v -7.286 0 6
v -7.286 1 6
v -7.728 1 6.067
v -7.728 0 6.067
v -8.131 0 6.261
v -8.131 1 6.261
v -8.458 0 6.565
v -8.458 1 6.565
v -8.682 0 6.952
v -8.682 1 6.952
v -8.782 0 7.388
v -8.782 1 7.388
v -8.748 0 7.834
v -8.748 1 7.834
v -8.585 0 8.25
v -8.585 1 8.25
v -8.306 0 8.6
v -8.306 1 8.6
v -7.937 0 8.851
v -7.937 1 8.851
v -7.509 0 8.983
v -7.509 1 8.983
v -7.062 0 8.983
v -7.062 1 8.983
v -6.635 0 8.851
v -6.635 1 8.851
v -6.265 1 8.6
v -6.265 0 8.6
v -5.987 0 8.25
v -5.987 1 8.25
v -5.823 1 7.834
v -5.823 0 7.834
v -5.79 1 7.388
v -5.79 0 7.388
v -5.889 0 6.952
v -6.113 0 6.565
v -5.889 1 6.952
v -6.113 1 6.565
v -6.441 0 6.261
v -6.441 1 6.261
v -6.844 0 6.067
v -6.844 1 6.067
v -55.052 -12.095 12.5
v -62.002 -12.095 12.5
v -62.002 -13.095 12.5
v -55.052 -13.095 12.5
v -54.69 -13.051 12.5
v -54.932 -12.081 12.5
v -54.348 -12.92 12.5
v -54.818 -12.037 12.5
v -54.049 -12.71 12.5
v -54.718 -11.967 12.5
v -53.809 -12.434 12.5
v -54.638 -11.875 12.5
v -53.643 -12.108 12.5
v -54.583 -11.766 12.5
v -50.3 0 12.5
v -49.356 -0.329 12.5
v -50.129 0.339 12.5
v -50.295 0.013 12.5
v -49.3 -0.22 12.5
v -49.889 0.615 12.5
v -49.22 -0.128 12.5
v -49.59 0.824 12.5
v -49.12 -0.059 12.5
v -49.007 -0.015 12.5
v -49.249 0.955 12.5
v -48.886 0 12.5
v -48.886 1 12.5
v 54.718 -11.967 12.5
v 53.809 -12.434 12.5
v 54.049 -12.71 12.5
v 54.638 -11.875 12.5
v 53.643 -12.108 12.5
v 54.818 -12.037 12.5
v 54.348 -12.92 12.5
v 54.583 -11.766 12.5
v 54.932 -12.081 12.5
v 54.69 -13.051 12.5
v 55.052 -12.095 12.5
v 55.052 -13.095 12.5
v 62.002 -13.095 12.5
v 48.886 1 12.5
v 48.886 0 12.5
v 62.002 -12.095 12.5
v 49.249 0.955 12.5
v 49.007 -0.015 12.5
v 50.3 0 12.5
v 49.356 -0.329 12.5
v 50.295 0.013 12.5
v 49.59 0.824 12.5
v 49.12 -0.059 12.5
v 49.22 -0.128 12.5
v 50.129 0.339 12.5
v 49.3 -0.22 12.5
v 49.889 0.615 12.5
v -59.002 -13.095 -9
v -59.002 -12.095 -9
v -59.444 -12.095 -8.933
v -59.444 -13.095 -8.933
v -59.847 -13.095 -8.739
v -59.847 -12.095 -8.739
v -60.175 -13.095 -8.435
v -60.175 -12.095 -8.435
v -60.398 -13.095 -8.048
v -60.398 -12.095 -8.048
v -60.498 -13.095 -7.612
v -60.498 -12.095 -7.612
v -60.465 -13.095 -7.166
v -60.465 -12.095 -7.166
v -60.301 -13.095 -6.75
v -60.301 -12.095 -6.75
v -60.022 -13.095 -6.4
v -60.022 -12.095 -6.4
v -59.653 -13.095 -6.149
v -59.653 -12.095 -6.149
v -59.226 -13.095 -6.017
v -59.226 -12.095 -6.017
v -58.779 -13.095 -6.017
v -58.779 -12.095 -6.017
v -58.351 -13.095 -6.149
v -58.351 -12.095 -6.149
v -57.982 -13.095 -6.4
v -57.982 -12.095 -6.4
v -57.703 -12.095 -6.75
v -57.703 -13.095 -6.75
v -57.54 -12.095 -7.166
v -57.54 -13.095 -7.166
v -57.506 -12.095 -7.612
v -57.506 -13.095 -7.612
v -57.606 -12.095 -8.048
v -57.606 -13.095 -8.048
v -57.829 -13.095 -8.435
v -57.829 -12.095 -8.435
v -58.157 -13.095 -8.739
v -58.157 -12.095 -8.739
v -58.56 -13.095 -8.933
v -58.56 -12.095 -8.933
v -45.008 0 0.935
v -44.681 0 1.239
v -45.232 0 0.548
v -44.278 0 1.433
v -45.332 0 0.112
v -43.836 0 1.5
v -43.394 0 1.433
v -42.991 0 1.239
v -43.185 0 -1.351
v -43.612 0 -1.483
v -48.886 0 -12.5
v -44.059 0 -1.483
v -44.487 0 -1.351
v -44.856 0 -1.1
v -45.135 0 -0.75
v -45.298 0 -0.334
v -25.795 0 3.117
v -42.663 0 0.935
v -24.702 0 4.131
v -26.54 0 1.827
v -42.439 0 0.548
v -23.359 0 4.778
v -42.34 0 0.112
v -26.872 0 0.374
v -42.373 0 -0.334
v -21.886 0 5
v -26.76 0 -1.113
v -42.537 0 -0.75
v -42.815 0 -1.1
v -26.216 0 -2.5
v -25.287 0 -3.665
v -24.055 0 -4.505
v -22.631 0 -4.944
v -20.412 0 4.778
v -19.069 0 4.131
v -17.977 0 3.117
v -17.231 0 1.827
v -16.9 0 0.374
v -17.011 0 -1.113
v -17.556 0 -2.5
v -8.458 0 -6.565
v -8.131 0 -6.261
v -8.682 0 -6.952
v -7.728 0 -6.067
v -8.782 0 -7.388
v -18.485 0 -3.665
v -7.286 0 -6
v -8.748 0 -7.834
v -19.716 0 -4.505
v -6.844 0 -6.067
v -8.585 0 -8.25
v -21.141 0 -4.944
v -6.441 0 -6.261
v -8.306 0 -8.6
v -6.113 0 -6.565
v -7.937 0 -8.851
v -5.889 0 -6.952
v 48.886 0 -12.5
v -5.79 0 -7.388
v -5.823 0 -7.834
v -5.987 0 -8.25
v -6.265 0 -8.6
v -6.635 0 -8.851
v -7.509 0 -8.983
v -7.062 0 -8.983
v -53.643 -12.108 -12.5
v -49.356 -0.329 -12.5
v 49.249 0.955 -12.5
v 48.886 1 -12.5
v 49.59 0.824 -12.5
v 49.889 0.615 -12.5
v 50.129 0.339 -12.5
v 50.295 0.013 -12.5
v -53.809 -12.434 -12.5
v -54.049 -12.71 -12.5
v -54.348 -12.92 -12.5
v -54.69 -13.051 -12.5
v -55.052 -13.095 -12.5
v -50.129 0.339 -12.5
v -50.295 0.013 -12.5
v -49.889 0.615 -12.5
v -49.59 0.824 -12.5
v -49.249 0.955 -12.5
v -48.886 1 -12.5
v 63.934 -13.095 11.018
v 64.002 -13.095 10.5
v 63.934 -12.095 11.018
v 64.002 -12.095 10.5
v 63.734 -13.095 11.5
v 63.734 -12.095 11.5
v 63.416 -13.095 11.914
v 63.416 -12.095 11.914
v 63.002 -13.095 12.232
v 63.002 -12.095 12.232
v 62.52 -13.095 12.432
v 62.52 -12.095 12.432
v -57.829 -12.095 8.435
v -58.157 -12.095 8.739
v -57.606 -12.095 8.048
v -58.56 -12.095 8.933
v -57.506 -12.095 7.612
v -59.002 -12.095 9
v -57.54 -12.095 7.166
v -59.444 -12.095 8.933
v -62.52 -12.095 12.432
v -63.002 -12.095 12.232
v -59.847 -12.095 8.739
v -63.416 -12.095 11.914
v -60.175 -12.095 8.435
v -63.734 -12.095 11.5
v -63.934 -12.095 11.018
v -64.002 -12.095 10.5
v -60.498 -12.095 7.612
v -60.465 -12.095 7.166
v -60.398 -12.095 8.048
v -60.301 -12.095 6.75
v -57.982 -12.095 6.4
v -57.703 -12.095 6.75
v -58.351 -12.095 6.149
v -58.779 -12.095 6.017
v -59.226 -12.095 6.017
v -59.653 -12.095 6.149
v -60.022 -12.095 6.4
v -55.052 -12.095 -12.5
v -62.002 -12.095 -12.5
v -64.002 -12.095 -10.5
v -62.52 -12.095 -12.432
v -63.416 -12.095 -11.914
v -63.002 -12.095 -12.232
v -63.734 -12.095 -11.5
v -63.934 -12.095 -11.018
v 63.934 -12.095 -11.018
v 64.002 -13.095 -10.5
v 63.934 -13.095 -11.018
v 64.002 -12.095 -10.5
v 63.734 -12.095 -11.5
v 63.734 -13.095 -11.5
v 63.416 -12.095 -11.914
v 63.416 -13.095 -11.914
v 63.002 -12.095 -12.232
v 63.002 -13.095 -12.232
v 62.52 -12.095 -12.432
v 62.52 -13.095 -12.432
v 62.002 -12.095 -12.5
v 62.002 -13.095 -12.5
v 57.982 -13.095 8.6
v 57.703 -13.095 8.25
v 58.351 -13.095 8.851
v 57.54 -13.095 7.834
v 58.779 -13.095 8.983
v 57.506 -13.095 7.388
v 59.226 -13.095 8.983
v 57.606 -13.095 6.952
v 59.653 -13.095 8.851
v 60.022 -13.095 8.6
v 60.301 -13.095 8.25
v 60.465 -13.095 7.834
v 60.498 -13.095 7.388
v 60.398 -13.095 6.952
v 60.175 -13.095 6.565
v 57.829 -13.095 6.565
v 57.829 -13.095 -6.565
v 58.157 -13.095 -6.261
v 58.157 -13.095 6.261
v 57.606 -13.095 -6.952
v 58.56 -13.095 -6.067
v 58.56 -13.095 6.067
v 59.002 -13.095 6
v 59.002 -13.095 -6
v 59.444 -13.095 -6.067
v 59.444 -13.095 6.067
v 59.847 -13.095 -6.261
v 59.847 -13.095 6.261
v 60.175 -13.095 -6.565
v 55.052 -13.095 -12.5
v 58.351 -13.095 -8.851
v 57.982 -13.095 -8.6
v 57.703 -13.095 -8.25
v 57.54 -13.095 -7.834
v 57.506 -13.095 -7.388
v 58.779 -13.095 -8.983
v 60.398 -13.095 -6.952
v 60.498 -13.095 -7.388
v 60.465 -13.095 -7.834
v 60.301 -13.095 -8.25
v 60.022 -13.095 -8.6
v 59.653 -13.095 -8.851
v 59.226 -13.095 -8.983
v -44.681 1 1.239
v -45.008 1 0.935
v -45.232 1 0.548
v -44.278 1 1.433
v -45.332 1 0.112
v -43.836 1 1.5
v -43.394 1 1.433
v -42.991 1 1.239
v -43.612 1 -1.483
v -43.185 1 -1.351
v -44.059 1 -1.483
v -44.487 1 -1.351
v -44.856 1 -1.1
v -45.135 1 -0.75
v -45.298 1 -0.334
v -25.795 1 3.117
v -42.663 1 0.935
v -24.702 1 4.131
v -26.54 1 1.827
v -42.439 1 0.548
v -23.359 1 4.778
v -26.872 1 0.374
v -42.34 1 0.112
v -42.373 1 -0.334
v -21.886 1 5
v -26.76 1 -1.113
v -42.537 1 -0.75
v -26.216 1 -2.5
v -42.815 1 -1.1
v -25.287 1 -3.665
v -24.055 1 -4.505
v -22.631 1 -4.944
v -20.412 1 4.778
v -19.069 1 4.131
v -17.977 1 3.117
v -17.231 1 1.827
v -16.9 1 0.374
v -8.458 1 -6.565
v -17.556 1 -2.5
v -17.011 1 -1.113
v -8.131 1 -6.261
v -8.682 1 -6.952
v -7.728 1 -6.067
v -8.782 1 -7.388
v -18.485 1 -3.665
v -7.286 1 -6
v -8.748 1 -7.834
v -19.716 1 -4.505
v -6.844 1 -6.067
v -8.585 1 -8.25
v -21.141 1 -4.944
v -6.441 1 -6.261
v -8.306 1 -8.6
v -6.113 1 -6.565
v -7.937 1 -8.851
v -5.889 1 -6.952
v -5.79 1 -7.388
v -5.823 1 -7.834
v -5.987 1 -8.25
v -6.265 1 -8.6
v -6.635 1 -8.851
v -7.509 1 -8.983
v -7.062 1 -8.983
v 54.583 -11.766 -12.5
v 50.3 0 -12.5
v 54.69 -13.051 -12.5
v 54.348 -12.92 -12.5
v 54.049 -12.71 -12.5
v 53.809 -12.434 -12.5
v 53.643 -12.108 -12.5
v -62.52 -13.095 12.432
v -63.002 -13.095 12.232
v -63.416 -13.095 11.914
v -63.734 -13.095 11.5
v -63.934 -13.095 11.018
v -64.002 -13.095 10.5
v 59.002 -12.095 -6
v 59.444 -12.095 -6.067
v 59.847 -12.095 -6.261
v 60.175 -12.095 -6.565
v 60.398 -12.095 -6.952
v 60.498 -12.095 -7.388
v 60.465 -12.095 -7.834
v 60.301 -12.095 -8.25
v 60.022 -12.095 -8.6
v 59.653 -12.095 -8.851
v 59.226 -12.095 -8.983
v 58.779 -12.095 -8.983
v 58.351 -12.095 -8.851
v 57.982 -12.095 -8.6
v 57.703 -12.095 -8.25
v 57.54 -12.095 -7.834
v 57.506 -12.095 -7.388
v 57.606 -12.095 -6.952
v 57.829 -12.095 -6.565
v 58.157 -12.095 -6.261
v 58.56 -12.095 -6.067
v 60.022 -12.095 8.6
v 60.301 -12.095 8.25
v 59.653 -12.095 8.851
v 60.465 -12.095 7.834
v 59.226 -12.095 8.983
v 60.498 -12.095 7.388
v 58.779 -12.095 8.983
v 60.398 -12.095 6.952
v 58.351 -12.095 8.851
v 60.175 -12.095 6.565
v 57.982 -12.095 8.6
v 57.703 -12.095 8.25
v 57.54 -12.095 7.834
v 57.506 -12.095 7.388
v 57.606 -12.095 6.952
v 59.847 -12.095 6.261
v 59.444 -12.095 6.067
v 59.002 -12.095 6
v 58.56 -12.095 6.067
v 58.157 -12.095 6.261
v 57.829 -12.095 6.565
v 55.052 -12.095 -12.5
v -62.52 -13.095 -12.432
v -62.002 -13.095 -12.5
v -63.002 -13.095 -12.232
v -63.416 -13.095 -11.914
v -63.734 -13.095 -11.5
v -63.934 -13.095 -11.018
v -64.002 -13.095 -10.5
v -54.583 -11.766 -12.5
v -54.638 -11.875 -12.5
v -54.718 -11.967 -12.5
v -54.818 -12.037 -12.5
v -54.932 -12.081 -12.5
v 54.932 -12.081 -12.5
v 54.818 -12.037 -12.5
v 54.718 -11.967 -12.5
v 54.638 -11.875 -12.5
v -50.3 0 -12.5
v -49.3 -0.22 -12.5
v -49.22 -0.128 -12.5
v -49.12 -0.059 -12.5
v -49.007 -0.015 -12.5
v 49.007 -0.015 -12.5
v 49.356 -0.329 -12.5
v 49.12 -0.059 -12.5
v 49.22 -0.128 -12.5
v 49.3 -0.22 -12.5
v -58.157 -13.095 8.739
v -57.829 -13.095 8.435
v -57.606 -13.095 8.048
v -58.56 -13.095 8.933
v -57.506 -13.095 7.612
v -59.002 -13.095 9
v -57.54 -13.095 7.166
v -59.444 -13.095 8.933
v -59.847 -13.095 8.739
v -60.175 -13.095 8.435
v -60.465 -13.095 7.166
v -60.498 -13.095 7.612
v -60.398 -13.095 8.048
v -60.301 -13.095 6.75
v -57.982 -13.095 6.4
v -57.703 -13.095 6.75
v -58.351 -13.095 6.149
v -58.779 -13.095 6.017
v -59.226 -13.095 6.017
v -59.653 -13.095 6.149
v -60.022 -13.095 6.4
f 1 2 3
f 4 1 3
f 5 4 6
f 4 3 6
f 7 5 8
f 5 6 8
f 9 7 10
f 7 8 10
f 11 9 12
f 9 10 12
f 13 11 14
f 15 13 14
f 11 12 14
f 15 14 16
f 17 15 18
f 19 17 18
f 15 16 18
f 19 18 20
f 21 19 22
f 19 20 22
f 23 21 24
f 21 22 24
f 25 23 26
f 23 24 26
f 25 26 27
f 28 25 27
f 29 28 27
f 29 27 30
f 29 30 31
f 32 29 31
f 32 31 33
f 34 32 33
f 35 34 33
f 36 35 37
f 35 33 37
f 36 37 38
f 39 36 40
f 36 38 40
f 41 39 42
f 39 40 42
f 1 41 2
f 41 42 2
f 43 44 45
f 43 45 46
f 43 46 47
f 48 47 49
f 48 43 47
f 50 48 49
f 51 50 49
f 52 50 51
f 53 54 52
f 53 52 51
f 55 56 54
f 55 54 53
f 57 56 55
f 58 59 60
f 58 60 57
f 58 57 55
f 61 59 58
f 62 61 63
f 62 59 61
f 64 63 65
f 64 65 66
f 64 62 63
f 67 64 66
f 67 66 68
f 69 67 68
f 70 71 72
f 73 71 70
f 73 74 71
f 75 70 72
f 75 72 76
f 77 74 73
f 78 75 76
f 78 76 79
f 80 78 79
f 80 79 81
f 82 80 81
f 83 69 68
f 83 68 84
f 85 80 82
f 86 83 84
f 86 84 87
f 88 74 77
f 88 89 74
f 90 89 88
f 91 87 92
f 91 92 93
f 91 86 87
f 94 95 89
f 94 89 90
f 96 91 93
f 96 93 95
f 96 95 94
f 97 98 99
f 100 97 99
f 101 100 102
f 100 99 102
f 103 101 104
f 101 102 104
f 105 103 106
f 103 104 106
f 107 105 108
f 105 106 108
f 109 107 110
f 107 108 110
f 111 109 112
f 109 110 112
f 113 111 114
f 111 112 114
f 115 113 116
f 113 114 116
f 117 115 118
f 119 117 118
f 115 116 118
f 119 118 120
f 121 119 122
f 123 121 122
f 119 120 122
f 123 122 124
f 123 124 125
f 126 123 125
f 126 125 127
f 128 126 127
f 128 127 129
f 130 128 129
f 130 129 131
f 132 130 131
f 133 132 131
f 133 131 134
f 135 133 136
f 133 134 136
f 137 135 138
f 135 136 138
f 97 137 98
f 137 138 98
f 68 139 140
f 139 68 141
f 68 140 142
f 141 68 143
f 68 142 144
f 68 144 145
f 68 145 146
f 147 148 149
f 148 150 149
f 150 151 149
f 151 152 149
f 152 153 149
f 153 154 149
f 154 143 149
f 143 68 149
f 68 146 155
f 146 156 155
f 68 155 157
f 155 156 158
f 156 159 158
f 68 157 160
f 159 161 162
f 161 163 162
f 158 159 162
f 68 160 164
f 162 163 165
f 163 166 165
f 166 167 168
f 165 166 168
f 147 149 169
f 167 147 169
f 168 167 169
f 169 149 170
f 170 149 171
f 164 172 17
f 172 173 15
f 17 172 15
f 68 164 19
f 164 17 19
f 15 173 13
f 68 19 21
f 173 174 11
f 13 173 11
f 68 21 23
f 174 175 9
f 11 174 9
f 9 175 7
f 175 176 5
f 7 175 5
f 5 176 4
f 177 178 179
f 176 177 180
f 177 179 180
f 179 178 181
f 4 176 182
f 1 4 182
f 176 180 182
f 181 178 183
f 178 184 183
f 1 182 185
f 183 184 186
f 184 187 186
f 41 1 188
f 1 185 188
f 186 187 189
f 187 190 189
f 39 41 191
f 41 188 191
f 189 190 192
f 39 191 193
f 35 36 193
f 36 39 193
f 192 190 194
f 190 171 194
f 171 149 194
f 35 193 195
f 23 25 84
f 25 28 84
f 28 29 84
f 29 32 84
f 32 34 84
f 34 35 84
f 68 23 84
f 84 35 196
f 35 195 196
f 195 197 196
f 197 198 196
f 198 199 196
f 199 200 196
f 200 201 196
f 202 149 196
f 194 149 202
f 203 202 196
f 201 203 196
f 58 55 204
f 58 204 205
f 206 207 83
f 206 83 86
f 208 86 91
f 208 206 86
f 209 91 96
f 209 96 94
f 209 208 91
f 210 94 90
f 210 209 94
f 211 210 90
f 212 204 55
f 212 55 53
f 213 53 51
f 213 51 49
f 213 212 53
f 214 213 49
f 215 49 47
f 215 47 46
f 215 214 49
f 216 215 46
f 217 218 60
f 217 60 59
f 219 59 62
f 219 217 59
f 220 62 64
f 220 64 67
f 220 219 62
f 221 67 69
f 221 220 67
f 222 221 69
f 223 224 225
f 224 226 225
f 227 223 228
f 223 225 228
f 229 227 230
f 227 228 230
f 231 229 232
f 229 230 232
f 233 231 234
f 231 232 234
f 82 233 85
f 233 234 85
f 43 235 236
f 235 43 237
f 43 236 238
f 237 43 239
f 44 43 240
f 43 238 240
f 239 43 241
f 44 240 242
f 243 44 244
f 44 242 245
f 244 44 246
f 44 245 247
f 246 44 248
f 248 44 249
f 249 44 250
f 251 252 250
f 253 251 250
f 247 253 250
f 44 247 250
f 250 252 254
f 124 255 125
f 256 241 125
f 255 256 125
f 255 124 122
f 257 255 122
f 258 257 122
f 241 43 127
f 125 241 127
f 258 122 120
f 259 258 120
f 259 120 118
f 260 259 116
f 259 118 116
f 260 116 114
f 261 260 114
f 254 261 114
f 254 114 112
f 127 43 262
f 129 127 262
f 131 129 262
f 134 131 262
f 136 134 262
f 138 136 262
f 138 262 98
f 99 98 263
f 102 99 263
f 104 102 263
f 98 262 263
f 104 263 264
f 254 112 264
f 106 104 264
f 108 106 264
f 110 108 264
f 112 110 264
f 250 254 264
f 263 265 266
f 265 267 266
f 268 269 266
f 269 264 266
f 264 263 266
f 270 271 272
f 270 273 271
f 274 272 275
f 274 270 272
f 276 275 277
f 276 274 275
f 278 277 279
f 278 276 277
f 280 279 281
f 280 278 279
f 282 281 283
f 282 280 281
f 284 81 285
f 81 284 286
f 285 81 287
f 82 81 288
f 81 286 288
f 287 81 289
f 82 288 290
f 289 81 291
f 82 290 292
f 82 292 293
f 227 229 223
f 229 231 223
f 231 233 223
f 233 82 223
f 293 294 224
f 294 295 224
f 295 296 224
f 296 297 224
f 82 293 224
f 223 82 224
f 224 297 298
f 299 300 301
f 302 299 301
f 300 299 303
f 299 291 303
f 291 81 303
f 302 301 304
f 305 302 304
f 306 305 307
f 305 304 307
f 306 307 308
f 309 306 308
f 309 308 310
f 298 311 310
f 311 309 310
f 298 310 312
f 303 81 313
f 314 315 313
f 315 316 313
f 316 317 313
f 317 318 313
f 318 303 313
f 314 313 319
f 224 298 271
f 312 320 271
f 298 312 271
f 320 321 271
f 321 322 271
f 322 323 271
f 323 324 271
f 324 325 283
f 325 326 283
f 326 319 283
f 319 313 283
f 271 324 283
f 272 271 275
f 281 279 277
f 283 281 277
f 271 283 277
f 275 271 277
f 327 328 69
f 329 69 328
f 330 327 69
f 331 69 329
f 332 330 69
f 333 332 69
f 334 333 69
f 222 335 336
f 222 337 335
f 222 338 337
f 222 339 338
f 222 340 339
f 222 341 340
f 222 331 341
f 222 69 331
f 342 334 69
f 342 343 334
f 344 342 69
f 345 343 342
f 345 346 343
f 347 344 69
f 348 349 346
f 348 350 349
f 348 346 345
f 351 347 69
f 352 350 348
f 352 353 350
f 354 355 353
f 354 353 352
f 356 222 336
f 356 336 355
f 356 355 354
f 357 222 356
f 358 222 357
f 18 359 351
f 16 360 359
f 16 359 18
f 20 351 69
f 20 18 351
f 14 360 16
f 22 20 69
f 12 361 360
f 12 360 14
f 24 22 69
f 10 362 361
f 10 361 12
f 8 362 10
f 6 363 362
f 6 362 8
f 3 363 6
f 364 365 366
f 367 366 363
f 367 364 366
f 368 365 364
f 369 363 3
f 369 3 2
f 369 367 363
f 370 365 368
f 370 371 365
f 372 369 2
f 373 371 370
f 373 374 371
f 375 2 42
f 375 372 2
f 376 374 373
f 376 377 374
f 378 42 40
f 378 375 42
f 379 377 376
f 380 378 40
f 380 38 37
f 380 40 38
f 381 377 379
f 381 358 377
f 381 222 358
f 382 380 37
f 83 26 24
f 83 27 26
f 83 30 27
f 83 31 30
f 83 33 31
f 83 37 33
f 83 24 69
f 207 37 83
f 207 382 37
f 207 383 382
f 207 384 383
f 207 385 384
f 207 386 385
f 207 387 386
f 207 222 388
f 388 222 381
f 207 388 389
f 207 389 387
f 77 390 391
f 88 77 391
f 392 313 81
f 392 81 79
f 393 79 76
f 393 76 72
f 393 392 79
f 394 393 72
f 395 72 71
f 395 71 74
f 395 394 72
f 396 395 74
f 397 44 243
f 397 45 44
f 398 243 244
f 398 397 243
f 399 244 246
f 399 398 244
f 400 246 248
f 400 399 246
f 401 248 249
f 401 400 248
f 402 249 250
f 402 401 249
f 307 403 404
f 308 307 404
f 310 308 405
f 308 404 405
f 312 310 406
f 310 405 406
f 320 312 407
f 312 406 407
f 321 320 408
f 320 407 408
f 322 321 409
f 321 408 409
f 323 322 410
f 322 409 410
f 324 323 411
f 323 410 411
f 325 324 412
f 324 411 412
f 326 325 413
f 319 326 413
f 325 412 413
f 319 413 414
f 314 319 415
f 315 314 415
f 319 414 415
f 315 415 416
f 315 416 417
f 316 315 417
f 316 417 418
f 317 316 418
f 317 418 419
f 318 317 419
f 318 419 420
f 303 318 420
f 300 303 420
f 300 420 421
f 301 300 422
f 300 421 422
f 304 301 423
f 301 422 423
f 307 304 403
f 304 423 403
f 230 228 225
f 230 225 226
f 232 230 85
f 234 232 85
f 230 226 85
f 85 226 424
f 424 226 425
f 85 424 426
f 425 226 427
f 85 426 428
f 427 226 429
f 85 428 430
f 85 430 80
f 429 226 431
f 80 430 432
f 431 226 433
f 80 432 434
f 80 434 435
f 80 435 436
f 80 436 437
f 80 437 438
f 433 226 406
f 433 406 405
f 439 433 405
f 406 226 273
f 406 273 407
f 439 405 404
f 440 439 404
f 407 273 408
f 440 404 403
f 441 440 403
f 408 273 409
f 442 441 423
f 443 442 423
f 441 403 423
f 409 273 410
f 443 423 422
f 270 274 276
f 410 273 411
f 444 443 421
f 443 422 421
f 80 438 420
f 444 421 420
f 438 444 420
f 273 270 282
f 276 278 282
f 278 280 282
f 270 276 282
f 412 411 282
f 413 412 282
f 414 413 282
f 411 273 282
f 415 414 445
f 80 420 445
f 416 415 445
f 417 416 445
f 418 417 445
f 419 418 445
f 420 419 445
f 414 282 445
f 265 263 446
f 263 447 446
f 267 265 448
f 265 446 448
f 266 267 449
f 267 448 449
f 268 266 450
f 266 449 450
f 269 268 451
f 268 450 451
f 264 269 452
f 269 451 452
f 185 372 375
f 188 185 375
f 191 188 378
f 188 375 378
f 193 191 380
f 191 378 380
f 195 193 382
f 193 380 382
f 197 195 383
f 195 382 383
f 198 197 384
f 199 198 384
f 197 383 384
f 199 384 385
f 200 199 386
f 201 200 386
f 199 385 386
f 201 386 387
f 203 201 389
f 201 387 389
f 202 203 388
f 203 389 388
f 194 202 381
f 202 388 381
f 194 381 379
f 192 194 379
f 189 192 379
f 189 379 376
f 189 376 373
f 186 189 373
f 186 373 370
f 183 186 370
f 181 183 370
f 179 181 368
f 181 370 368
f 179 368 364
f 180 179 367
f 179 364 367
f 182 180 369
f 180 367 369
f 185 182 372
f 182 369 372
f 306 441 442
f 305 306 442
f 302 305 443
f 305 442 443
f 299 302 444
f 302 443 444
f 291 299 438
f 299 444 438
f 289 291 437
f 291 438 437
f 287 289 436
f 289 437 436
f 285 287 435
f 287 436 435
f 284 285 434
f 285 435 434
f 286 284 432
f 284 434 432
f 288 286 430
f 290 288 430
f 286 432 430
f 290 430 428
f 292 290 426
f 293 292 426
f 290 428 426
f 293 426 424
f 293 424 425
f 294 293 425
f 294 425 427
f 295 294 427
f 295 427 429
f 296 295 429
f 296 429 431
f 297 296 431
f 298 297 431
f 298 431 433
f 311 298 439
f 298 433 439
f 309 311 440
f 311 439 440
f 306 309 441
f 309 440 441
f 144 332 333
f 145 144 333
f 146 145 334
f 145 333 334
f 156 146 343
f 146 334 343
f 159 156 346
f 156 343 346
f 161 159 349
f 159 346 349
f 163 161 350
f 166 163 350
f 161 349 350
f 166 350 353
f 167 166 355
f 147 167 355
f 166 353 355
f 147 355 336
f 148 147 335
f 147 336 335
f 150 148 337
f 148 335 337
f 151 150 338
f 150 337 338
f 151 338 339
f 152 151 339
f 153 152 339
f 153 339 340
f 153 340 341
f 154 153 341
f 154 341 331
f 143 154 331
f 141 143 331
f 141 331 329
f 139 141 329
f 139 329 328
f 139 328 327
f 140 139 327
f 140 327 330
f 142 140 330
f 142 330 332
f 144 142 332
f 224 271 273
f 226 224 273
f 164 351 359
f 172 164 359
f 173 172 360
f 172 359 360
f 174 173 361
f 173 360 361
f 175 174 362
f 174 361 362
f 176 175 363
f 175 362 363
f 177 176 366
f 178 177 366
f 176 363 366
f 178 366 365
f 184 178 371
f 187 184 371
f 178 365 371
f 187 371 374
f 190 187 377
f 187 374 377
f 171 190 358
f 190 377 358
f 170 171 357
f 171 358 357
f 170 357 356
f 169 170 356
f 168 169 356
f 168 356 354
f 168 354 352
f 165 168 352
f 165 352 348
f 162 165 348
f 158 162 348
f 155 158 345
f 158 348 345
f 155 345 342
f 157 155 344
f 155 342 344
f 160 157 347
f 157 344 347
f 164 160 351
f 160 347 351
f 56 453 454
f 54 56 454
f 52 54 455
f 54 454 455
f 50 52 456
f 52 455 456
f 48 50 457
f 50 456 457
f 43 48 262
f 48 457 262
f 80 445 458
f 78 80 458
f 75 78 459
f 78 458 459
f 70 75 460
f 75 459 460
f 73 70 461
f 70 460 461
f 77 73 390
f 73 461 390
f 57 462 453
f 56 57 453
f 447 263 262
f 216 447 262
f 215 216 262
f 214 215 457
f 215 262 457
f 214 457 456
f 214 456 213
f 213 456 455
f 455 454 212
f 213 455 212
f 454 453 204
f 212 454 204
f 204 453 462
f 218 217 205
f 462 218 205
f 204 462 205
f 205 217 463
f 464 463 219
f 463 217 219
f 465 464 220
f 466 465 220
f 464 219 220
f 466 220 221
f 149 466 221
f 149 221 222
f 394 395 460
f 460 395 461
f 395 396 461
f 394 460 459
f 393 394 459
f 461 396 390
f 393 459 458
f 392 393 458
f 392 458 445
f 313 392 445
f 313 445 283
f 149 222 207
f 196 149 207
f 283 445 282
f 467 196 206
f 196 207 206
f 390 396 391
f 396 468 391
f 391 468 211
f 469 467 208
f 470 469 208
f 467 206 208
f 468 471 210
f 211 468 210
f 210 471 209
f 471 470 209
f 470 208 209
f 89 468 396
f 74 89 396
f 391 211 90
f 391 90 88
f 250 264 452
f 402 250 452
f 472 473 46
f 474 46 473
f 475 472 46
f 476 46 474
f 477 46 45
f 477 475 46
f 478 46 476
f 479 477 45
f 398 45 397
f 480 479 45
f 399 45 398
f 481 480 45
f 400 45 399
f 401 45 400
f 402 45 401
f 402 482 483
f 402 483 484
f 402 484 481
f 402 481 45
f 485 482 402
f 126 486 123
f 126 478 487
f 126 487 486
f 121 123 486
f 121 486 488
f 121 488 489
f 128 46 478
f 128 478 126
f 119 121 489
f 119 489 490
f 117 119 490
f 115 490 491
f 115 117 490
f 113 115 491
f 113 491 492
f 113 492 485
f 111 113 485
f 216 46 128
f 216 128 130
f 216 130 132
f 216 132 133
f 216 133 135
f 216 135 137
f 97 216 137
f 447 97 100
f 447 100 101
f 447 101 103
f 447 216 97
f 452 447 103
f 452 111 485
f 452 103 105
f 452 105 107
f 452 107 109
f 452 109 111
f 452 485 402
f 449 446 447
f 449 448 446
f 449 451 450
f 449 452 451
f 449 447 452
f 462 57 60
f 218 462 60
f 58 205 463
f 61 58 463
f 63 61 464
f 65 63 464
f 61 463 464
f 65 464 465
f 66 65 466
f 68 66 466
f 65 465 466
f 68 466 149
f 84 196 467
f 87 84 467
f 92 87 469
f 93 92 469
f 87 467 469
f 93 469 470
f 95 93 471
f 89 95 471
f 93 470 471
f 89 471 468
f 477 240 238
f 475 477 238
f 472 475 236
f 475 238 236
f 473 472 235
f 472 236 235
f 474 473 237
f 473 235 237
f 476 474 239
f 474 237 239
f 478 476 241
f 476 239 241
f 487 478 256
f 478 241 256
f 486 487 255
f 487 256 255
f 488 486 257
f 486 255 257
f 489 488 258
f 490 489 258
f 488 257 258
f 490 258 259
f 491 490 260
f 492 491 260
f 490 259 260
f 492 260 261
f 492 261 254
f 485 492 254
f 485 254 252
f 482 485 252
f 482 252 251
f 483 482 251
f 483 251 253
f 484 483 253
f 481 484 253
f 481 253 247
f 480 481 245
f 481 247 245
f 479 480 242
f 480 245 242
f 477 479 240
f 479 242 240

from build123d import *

# Parameters (mm, degrees)
SKETCH_1_W               = 100.6
SKETCH_1_H               = 25
EXTRUDE_1_DEPTH          = 1
SM_START                 = -12.5
SM_EDGE_FLANGE_1_DEPTH   = 25
SM_EDGE_FLANGE_1_2_DEPTH = 25
SM_EDGE_FLANGE_2_DEPTH   = 25
SM_EDGE_FLANGE_2_2_DEPTH = 25
SKETCH_18_R              = 1.5
CUT_EXTRUDE_1_DEPTH      = 1
SKETCH_19_R              = 1.5
CUT_EXTRUDE_2_DEPTH      = 1
FILLET_1_R               = 2
SKETCH_21_R              = 5
CUT_EXTRUDE_3_DEPTH      = 1
SKETCH_22_R              = 1.5
CUT_EXTRUDE_4_DEPTH      = 10


# Read off the part's stored shape, not the designer's step: Ребро-кромка1, Ребро-кромка2
with BuildPart() as part:
    # Sketch 1 → Бобышка-Вытянуть1 (new body)
    with BuildSketch(Plane(origin=(0, 0, 0), x_dir=(1, 0, 0), z_dir=(0, 1, 0))):
        Rectangle(SKETCH_1_W, SKETCH_1_H)
    extrude(amount=EXTRUDE_1_DEPTH)

    # Ребро-кромка1 outline → Ребро-кромка1 (cut)
    with BuildSketch(Plane.XY.offset(SM_START)):
        with BuildLine():
            Line((-50.3, 0), (-50.29525739, 0.013030215))
            ThreePointArc((-50.29525739, 0.013030215), (-49.746083113, 0.728728066), (-48.885718458, 1))
            Line((-48.885718458, 1), (-50.3, 1))
            Line((-50.3, 1), (-50.3, 0))
        make_face()
        with BuildLine():
            Line((50.3, 1), (48.885718458, 1))
            ThreePointArc((48.885718458, 1), (49.746083113, 0.728728066), (50.29525739, 0.013030215))
            Line((50.29525739, 0.013030215), (50.3, 0))
            Line((50.3, 0), (50.3, 1))
        make_face()
    extrude(amount=SM_EDGE_FLANGE_1_DEPTH, mode=Mode.SUBTRACT)

    # Sm Edge Flange 1 2 outline → Sm Edge Flange 1 2 (add)
    with BuildSketch(Plane.XY.offset(SM_START)):
        with BuildLine():
            Line((-48.885718458, 0), (-50.3, 0))
            Line((-50.3, 0), (-55.066331916, -13.095389312))
            Line((-55.066331916, -13.095389312), (-54.126639295, -13.437409455))
            Line((-54.126639295, -13.437409455), (-49.355564769, -0.328989928))
            ThreePointArc((-49.355564769, -0.328989928), (-49.172506676, -0.090423978), (-48.885718458, 0))
        make_face()
        with BuildLine():
            Line((50.3, 0), (48.885718458, 0))
            ThreePointArc((48.885718458, 0), (49.172506676, -0.090423978), (49.355564769, -0.328989928))
            Line((49.355564769, -0.328989928), (54.126639295, -13.437409455))
            Line((54.126639295, -13.437409455), (55.066331916, -13.095389312))
            Line((55.066331916, -13.095389312), (50.3, 0))
        make_face()
    extrude(amount=SM_EDGE_FLANGE_1_2_DEPTH)

    # Ребро-кромка2 outline → Ребро-кромка2 (cut)
    with BuildSketch(Plane.XY.offset(SM_START)):
        with BuildLine():
            Line((55.066331916, -13.095389312), (55.05246545, -13.095389312))
            ThreePointArc((55.05246545, -13.095389312), (54.192100796, -12.824117378), (53.642926519, -12.108419527))
            Line((53.642926519, -12.108419527), (54.126639295, -13.437409455))
            Line((54.126639295, -13.437409455), (55.066331916, -13.095389312))
        make_face()
        with BuildLine():
            Line((-55.05246545, -13.095389312), (-55.066331916, -13.095389312))
            Line((-55.066331916, -13.095389312), (-54.126639295, -13.437409455))
            Line((-54.126639295, -13.437409455), (-53.642926519, -12.108419527))
            ThreePointArc((-53.642926519, -12.108419527), (-54.192100796, -12.824117378), (-55.05246545, -13.095389312))
        make_face()
    extrude(amount=SM_EDGE_FLANGE_2_DEPTH, mode=Mode.SUBTRACT)

    # Sm Edge Flange 2 2 outline → Sm Edge Flange 2 2 (add)
    with BuildSketch(Plane.XY.offset(SM_START)):
        with BuildLine():
            Line((54.58261914, -11.766399383), (55.066331916, -13.095389312))
            Line((55.066331916, -13.095389312), (64.002154143, -13.095389312))
            Line((64.002154143, -13.095389312), (64.002154143, -12.095389312))
            Line((64.002154143, -12.095389312), (55.05246545, -12.095389312))
            ThreePointArc((55.05246545, -12.095389312), (54.765677232, -12.004965334), (54.58261914, -11.766399383))
        make_face()
        with BuildLine():
            Line((-64.002154143, -12.095389312), (-64.002154143, -13.095389312))
            Line((-64.002154143, -13.095389312), (-55.066331916, -13.095389312))
            Line((-55.066331916, -13.095389312), (-54.58261914, -11.766399383))
            ThreePointArc((-54.58261914, -11.766399383), (-54.765677232, -12.004965334), (-55.05246545, -12.095389312))
            Line((-55.05246545, -12.095389312), (-64.002154143, -12.095389312))
        make_face()
    extrude(amount=SM_EDGE_FLANGE_2_2_DEPTH)

    # Эскиз18 → Вырез-Вытянуть1 (cut)
    with BuildSketch(Plane(origin=(0, 1, 0), x_dir=(1, 0, 0), z_dir=(0, 1, 0))):
        with Locations(Location((-7.285718458, 7.5, 0), (0, 0, 270))):
            Circle(SKETCH_18_R)
        with Locations(Location((-7.285718458, -7.5, 0), (0, 0, 90))):
            Circle(SKETCH_18_R)
    extrude(amount=-CUT_EXTRUDE_1_DEPTH, mode=Mode.SUBTRACT)

    # Эскиз19 → Вырез-Вытянуть2 (cut)
    with BuildSketch(Plane(origin=(0, -12.095389312, 0), x_dir=(1, 0, 0), z_dir=(0, 1, 0))):
        with Locations(Location((59.002154143, 7.5, 0), (0, 0, 270))):
            Circle(SKETCH_19_R)
        with Locations(Location((59.002154143, -7.5, 0), (0, 0, 90))):
            Circle(SKETCH_19_R)
        with Locations(Location((-59.002154143, -7.5, 0), (0, 0, 270))):
            Circle(SKETCH_19_R)
        with Locations(Location((-59.002154143, 7.5, 0), (0, 0, 90))):
            Circle(SKETCH_19_R)
    extrude(amount=-CUT_EXTRUDE_2_DEPTH, mode=Mode.SUBTRACT)

    # Скругление1
    fillet_1_edges = [part.edges().sort_by_distance(p)[0] for p in [
        (64.002154143, -12.595389312, 12.5),
        (64.002154143, -12.595389312, -12.5),
        (-64.002154143, -12.595389312, -12.5),
        (-64.002154143, -12.595389312, 12.5),
    ]]
    fillet(fillet_1_edges, radius=FILLET_1_R)

    # Эскиз21 → Вырез-Вытянуть3 (cut)
    with BuildSketch(Plane(origin=(0, 1, 0), x_dir=(1, 0, 0), z_dir=(0, 1, 0))):
        with Locations(Location((-21.885718458, 0, 0), (0, 0, 270))):
            Circle(SKETCH_21_R)
    extrude(amount=-CUT_EXTRUDE_3_DEPTH, mode=Mode.SUBTRACT)

    # Эскиз22 → Вырез-Вытянуть4 (cut)
    with BuildSketch(Plane(origin=(0, 1, 0), x_dir=(1, 0, 0), z_dir=(0, 1, 0))):
        with Locations(Location((-43.835718458, 0, 0), (0, 0, 270))):
            Circle(SKETCH_22_R)
    extrude(amount=-CUT_EXTRUDE_4_DEPTH, mode=Mode.SUBTRACT)


solid = part.part
